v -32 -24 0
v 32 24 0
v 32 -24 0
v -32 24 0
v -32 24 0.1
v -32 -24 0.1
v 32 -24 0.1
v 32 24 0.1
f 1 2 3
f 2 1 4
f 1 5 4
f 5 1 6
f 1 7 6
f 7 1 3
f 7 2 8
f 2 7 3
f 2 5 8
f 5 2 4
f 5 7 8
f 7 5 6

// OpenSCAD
// file: ../p/4-4edge.scad
use <../lib.scad>
$fa=1; $fs=0.2;
function ldraw_lib__4_4edge(realsolid=false) = [
// 0 Circle 1.0
// 0 Name: 4-4edge.dat
// 0 Author: James Jessiman
// 0 !LDRAW_ORG Primitive UPDATE 2017-01
// 0 !LICENSE Licensed under CC BY 2.0 and CC BY 4.0 : see CAreadme.txt
// 
// 0 BFC CERTIFY CCW
  [0,"BFC","CERTIFY"],
  [0,"BFC","CCW"],
// 
// 0 !HISTORY 1998-12-15 [PTadmin] Official Update 1998-10
// 0 !HISTORY 2005-12-28 [PTadmin] Official Update 2005-01
// 0 !HISTORY 2007-06-24 [PTadmin] Header formatted for Contributor Agreement
// 0 !HISTORY 2008-07-01 [PTadmin] Official Update 2008-01
// 0 !HISTORY 2017-01-15 [Steffen] BFCed
// 0 !HISTORY 2017-12-30 [PTadmin] Official Update 2017-01
// 
// 
// 2 24 1 0 0 0.9239 0 0.3827
  [2,24,1,0,0,0.9239,0,0.3827],
// 2 24 0.9239 0 0.3827 0.7071 0 0.7071
  [2,24,0.9239,0,0.3827,0.7071,0,0.7071],
// 2 24 0.7071 0 0.7071 0.3827 0 0.9239
  [2,24,0.7071,0,0.7071,0.3827,0,0.9239],
// 2 24 0.3827 0 0.9239 0 0 1
  [2,24,0.3827,0,0.9239,0,0,1],
// 2 24 0 0 1 -0.3827 0 0.9239
  [2,24,0,0,1,-0.3827,0,0.9239],
// 2 24 -0.3827 0 0.9239 -0.7071 0 0.7071
  [2,24,-0.3827,0,0.9239,-0.7071,0,0.7071],
// 2 24 -0.7071 0 0.7071 -0.9239 0 0.3827
  [2,24,-0.7071,0,0.7071,-0.9239,0,0.3827],
// 2 24 -0.9239 0 0.3827 -1 0 -0
  [2,24,-0.9239,0,0.3827,-1,0,-0],
// 2 24 -1 0 -0 -0.9239 0 -0.3827
  [2,24,-1,0,-0,-0.9239,0,-0.3827],
// 2 24 -0.9239 0 -0.3827 -0.7071 0 -0.7071
  [2,24,-0.9239,0,-0.3827,-0.7071,0,-0.7071],
// 2 24 -0.7071 0 -0.7071 -0.3827 0 -0.9239
  [2,24,-0.7071,0,-0.7071,-0.3827,0,-0.9239],
// 2 24 -0.3827 0 -0.9239 0 0 -1
  [2,24,-0.3827,0,-0.9239,0,0,-1],
// 2 24 0 0 -1 0.3827 0 -0.9239
  [2,24,0,0,-1,0.3827,0,-0.9239],
// 2 24 0.3827 0 -0.9239 0.7071 0 -0.7071
  [2,24,0.3827,0,-0.9239,0.7071,0,-0.7071],
// 2 24 0.7071 0 -0.7071 0.9239 0 -0.3827
  [2,24,0.7071,0,-0.7071,0.9239,0,-0.3827],
// 2 24 0.9239 0 -0.3827 1 0 0
  [2,24,0.9239,0,-0.3827,1,0,0],
];
module ldraw_lib__4_4edge(step=0, col=false, unit=2/5, alt=false, line=0.2, solid=!$preview)
    makepoly(ldraw_lib__4_4edge(solid), step=step, col=col, unit=unit, alt=alt, line=line, solid=solid);
ldraw_lib__4_4edge(line=0.2);
// file: ../p/4-4disc.scad
use <../lib.scad>
$fa=1; $fs=0.2;
function ldraw_lib__4_4disc(realsolid=false) = [
// 0 Disc 1.0
// 0 Name: 4-4disc.dat
// 0 Author: James Jessiman
// 0 !LDRAW_ORG Primitive UPDATE 2002-02
// 0 !LICENSE Licensed under CC BY 2.0 and CC BY 4.0 : see CAreadme.txt
// 
// 0 BFC CERTIFY CCW
  [0,"BFC","CERTIFY"],
  [0,"BFC","CCW"],
// 
// 0 !HISTORY 1998-12-15 [PTadmin] Official Update 1998-10
// 0 !HISTORY 2002-03-23 [sbliss] Added BFC statement
// 0 !HISTORY 2002-04-25 [PTadmin] Official Update 2002-02
// 0 !HISTORY 2007-06-24 [PTadmin] Header formatted for Contributor Agreement
// 0 !HISTORY 2008-07-01 [PTadmin] Official Update 2008-01
// 
// 
// 3 16 0 0 0 1 0 0 0.9239 0 0.3827
  [3,16,0,0,0,1,0,0,0.9239,0,0.3827],
// 3 16 0 0 0 0.9239 0 0.3827 0.7071 0 0.7071
  [3,16,0,0,0,0.9239,0,0.3827,0.7071,0,0.7071],
// 3 16 0 0 0 0.7071 0 0.7071 0.3827 0 0.9239
  [3,16,0,0,0,0.7071,0,0.7071,0.3827,0,0.9239],
// 3 16 0 0 0 0.3827 0 0.9239 0 0 1
  [3,16,0,0,0,0.3827,0,0.9239,0,0,1],
// 3 16 0 0 0 0 0 1 -0.3827 0 0.9239
  [3,16,0,0,0,0,0,1,-0.3827,0,0.9239],
// 3 16 0 0 0 -0.3827 0 0.9239 -0.7071 0 0.7071
  [3,16,0,0,0,-0.3827,0,0.9239,-0.7071,0,0.7071],
// 3 16 0 0 0 -0.7071 0 0.7071 -0.9239 0 0.3827
  [3,16,0,0,0,-0.7071,0,0.7071,-0.9239,0,0.3827],
// 3 16 0 0 0 -0.9239 0 0.3827 -1 0 -0
  [3,16,0,0,0,-0.9239,0,0.3827,-1,0,-0],
// 3 16 0 0 0 -1 0 -0 -0.9239 0 -0.3827
  [3,16,0,0,0,-1,0,-0,-0.9239,0,-0.3827],
// 3 16 0 0 0 -0.9239 0 -0.3827 -0.7071 0 -0.7071
  [3,16,0,0,0,-0.9239,0,-0.3827,-0.7071,0,-0.7071],
// 3 16 0 0 0 -0.7071 0 -0.7071 -0.3827 0 -0.9239
  [3,16,0,0,0,-0.7071,0,-0.7071,-0.3827,0,-0.9239],
// 3 16 0 0 0 -0.3827 0 -0.9239 0 0 -1
  [3,16,0,0,0,-0.3827,0,-0.9239,0,0,-1],
// 3 16 0 0 0 0 0 -1 0.3827 0 -0.9239
  [3,16,0,0,0,0,0,-1,0.3827,0,-0.9239],
// 3 16 0 0 0 0.3827 0 -0.9239 0.7071 0 -0.7071
  [3,16,0,0,0,0.3827,0,-0.9239,0.7071,0,-0.7071],
// 3 16 0 0 0 0.7071 0 -0.7071 0.9239 0 -0.3827
  [3,16,0,0,0,0.7071,0,-0.7071,0.9239,0,-0.3827],
// 3 16 0 0 0 0.9239 0 -0.3827 1 0 0
  [3,16,0,0,0,0.9239,0,-0.3827,1,0,0],
// 0
];
module ldraw_lib__4_4disc(step=0, col=false, unit=2/5, alt=false, line=0.2, solid=!$preview)
    makepoly(ldraw_lib__4_4disc(solid), step=step, col=col, unit=unit, alt=alt, line=line, solid=solid);
ldraw_lib__4_4disc(line=0.2);
// file: ../p/4-4cyli.scad
use <../lib.scad>
$fa=1; $fs=0.2;
function ldraw_lib__4_4cyli(realsolid=false) = [
// 0 Cylinder 1.0
// 0 Name: 4-4cyli.dat
// 0 Author: James Jessiman
// 0 !LDRAW_ORG Primitive UPDATE 2005-01
// 0 !LICENSE Licensed under CC BY 2.0 and CC BY 4.0 : see CAreadme.txt
// 
// 0 BFC CERTIFY CCW
  [0,"BFC","CERTIFY"],
  [0,"BFC","CCW"],
// 
// 0 !HISTORY 1998-12-15 [PTadmin] Official Update 1998-10
// 0 !HISTORY 2002-03-23 [sbliss] Added BFC statement; merged headers from files in distributions LDraw 0.27 and Complete.
// 0 !HISTORY 2002-04-25 [PTadmin] Official Update 2002-02
// 0 !HISTORY 2004-12-14 [guyvivan] BFC CCW
// 0 !HISTORY 2005-12-28 [PTadmin] Official Update 2005-01
// 0 !HISTORY 2007-06-24 [PTadmin] Header formatted for Contributor Agreement
// 0 !HISTORY 2008-07-01 [PTadmin] Official Update 2008-01
// 
// 
// 4 16 1 1 0 0.9239 1 0.3827 0.9239 0 0.3827 1 0 0
  [4,16,1,1,0,0.9239,1,0.3827,0.9239,0,0.3827,1,0,0],
// 5 24 1 0 0 1 1 0 0.9239 0 0.3827 0.9239 0 -0.3827
  [5,24,1,0,0,1,1,0,0.9239,0,0.3827,0.9239,0,-0.3827],
// 4 16 0.9239 1 0.3827 0.7071 1 0.7071 0.7071 0 0.7071 0.9239 0 0.3827
  [4,16,0.9239,1,0.3827,0.7071,1,0.7071,0.7071,0,0.7071,0.9239,0,0.3827],
// 5 24 0.9239 0 0.3827 0.9239 1 0.3827 0.7071 0 0.7071 1 0 0
  [5,24,0.9239,0,0.3827,0.9239,1,0.3827,0.7071,0,0.7071,1,0,0],
// 4 16 0.7071 1 0.7071 0.3827 1 0.9239 0.3827 0 0.9239 0.7071 0 0.7071
  [4,16,0.7071,1,0.7071,0.3827,1,0.9239,0.3827,0,0.9239,0.7071,0,0.7071],
// 5 24 0.7071 0 0.7071 0.7071 1 0.7071 0.3827 0 0.9239 0.9239 0 0.3827
  [5,24,0.7071,0,0.7071,0.7071,1,0.7071,0.3827,0,0.9239,0.9239,0,0.3827],
// 4 16 0.3827 1 0.9239 0 1 1 0 0 1 0.3827 0 0.9239
  [4,16,0.3827,1,0.9239,0,1,1,0,0,1,0.3827,0,0.9239],
// 5 24 0.3827 0 0.9239 0.3827 1 0.9239 0 0 1 0.7071 0 0.7071
  [5,24,0.3827,0,0.9239,0.3827,1,0.9239,0,0,1,0.7071,0,0.7071],
// 4 16 0 1 1 -0.3827 1 0.9239 -0.3827 0 0.9239 0 0 1
  [4,16,0,1,1,-0.3827,1,0.9239,-0.3827,0,0.9239,0,0,1],
// 5 24 0 0 1 0 1 1 -0.3827 0 0.9239 0.3827 0 0.9239
  [5,24,0,0,1,0,1,1,-0.3827,0,0.9239,0.3827,0,0.9239],
// 4 16 -0.3827 1 0.9239 -0.7071 1 0.7071 -0.7071 0 0.7071 -0.3827 0 0.9239
  [4,16,-0.3827,1,0.9239,-0.7071,1,0.7071,-0.7071,0,0.7071,-0.3827,0,0.9239],
// 5 24 -0.3827 0 0.9239 -0.3827 1 0.9239 -0.7071 0 0.7071 0 0 1
  [5,24,-0.3827,0,0.9239,-0.3827,1,0.9239,-0.7071,0,0.7071,0,0,1],
// 4 16 -0.7071 1 0.7071 -0.9239 1 0.3827 -0.9239 0 0.3827 -0.7071 0 0.7071
  [4,16,-0.7071,1,0.7071,-0.9239,1,0.3827,-0.9239,0,0.3827,-0.7071,0,0.7071],
// 5 24 -0.7071 0 0.7071 -0.7071 1 0.7071 -0.9239 0 0.3827 -0.3827 0 0.9239
  [5,24,-0.7071,0,0.7071,-0.7071,1,0.7071,-0.9239,0,0.3827,-0.3827,0,0.9239],
// 4 16 -0.9239 1 0.3827 -1 1 0 -1 0 0 -0.9239 0 0.3827
  [4,16,-0.9239,1,0.3827,-1,1,0,-1,0,0,-0.9239,0,0.3827],
// 5 24 -0.9239 0 0.3827 -0.9239 1 0.3827 -1 0 0 -0.7071 0 0.7071
  [5,24,-0.9239,0,0.3827,-0.9239,1,0.3827,-1,0,0,-0.7071,0,0.7071],
// 4 16 -1 1 0 -0.9239 1 -0.3827 -0.9239 0 -0.3827 -1 0 0
  [4,16,-1,1,0,-0.9239,1,-0.3827,-0.9239,0,-0.3827,-1,0,0],
// 5 24 -1 0 0 -1 1 0 -0.9239 0 -0.3827 -0.9239 0 0.3827
  [5,24,-1,0,0,-1,1,0,-0.9239,0,-0.3827,-0.9239,0,0.3827],
// 4 16 -0.9239 1 -0.3827 -0.7071 1 -0.7071 -0.7071 0 -0.7071 -0.9239 0 -0.3827
  [4,16,-0.9239,1,-0.3827,-0.7071,1,-0.7071,-0.7071,0,-0.7071,-0.9239,0,-0.3827],
// 5 24 -0.9239 0 -0.3827 -0.9239 1 -0.3827 -0.7071 0 -0.7071 -1 0 0
  [5,24,-0.9239,0,-0.3827,-0.9239,1,-0.3827,-0.7071,0,-0.7071,-1,0,0],
// 4 16 -0.7071 1 -0.7071 -0.3827 1 -0.9239 -0.3827 0 -0.9239 -0.7071 0 -0.7071
  [4,16,-0.7071,1,-0.7071,-0.3827,1,-0.9239,-0.3827,0,-0.9239,-0.7071,0,-0.7071],
// 5 24 -0.7071 0 -0.7071 -0.7071 1 -0.7071 -0.3827 0 -0.9239 -0.9239 0 -0.3827
  [5,24,-0.7071,0,-0.7071,-0.7071,1,-0.7071,-0.3827,0,-0.9239,-0.9239,0,-0.3827],
// 4 16 -0.3827 1 -0.9239 0 1 -1 0 0 -1 -0.3827 0 -0.9239
  [4,16,-0.3827,1,-0.9239,0,1,-1,0,0,-1,-0.3827,0,-0.9239],
// 5 24 -0.3827 0 -0.9239 -0.3827 1 -0.9239 0 0 -1 -0.7071 0 -0.7071
  [5,24,-0.3827,0,-0.9239,-0.3827,1,-0.9239,0,0,-1,-0.7071,0,-0.7071],
// 4 16 0 1 -1 0.3827 1 -0.9239 0.3827 0 -0.9239 0 0 -1
  [4,16,0,1,-1,0.3827,1,-0.9239,0.3827,0,-0.9239,0,0,-1],
// 5 24 0 0 -1 0 1 -1 0.3827 0 -0.9239 -0.3827 0 -0.9239
  [5,24,0,0,-1,0,1,-1,0.3827,0,-0.9239,-0.3827,0,-0.9239],
// 4 16 0.3827 1 -0.9239 0.7071 1 -0.7071 0.7071 0 -0.7071 0.3827 0 -0.9239
  [4,16,0.3827,1,-0.9239,0.7071,1,-0.7071,0.7071,0,-0.7071,0.3827,0,-0.9239],
// 5 24 0.3827 0 -0.9239 0.3827 1 -0.9239 0.7071 0 -0.7071 0 0 -1
  [5,24,0.3827,0,-0.9239,0.3827,1,-0.9239,0.7071,0,-0.7071,0,0,-1],
// 4 16 0.7071 1 -0.7071 0.9239 1 -0.3827 0.9239 0 -0.3827 0.7071 0 -0.7071
  [4,16,0.7071,1,-0.7071,0.9239,1,-0.3827,0.9239,0,-0.3827,0.7071,0,-0.7071],
// 5 24 0.7071 0 -0.7071 0.7071 1 -0.7071 0.9239 0 -0.3827 0.3827 0 -0.9239
  [5,24,0.7071,0,-0.7071,0.7071,1,-0.7071,0.9239,0,-0.3827,0.3827,0,-0.9239],
// 4 16 0.9239 1 -0.3827 1 1 0 1 0 0 0.9239 0 -0.3827
  [4,16,0.9239,1,-0.3827,1,1,0,1,0,0,0.9239,0,-0.3827],
// 5 24 0.9239 0 -0.3827 0.9239 1 -0.3827 1 0 0 0.7071 0 -0.7071
  [5,24,0.9239,0,-0.3827,0.9239,1,-0.3827,1,0,0,0.7071,0,-0.7071],
// 0
];
module ldraw_lib__4_4cyli(step=0, col=false, unit=2/5, alt=false, line=0.2, solid=!$preview)
    makepoly(ldraw_lib__4_4cyli(solid), step=step, col=col, unit=unit, alt=alt, line=line, solid=solid);
ldraw_lib__4_4cyli(line=0.2);
// file: ../p/stud3.scad
use <../lib.scad>
use <4-4cyli.scad>
use <4-4disc.scad>
use <4-4edge.scad>
$fa=1; $fs=0.2;
function ldraw_lib__stud3(realsolid=false) = realsolid ? 
    [openscad(translate([0,0,-eps()], o=cylinder(4+eps(), r=4)),2)] : [
// 0 Stud Tube Solid
// 0 Name: stud3.dat
// 0 Author: James Jessiman
// 0 !LDRAW_ORG Primitive UPDATE 2012-01
// 0 !LICENSE Licensed under CC BY 2.0 and CC BY 4.0 : see CAreadme.txt
// 
// 0 BFC CERTIFY CCW
  [0,"BFC","CERTIFY"],
  [0,"BFC","CCW"],
// 
// 0 !HISTORY 2002-04-04 [sbliss] Modified for BFC compliance
// 0 !HISTORY 2002-04-25 [PTadmin] Official Update 2002-02
// 0 !HISTORY 2007-06-24 [PTadmin] Header formatted for Contributor Agreement
// 0 !HISTORY 2008-07-01 [PTadmin] Official Update 2008-01
// 0 !HISTORY 2012-02-16 [Philo] Changed to CCW
// 0 !HISTORY 2012-03-30 [PTadmin] Official Update 2012-01
// 
// 
// 1 16 0 -4 0 4 0 0 0 1 0 0 0 4 4-4edge.dat
  [1,16,0,-4,0,4,0,0,0,1,0,0,0,4, ldraw_lib__4_4edge(realsolid)],
// 1 16 0 0 0 4 0 0 0 1 0 0 0 4 4-4edge.dat
  [1,16,0,0,0,4,0,0,0,1,0,0,0,4, ldraw_lib__4_4edge(realsolid)],
// 1 16 0 -4 0 4 0 0 0 1 0 0 0 4 4-4disc.dat
  [1,16,0,-4,0,4,0,0,0,1,0,0,0,4, ldraw_lib__4_4disc(realsolid)],
// 1 16 0 -4 0 4 0 0 0 4 0 0 0 4 4-4cyli.dat
  [1,16,0,-4,0,4,0,0,0,4,0,0,0,4, ldraw_lib__4_4cyli(realsolid)],
];
module ldraw_lib__stud3(step=0, col=false, unit=2/5, alt=false, line=0.2, solid=!$preview)
    makepoly(ldraw_lib__stud3(solid), step=step, col=col, unit=unit, alt=alt, line=line, solid=solid);
ldraw_lib__stud3(line=0.2);
// file: ../p/stud.scad
use <../lib.scad>
use <4-4cyli.scad>
use <4-4disc.scad>
use <4-4edge.scad>
$fa=1; $fs=0.2;
function ldraw_lib__stud(realsolid=false) = realsolid ? 
    [openscad(translate([0,0,-eps()], o=cylinder(4+eps(), r=6)),2)] : [
// 0 Stud
// 0 Name: stud.dat
// 0 Author: James Jessiman
// 0 !LDRAW_ORG Primitive UPDATE 2012-01
// 0 !LICENSE Licensed under CC BY 2.0 and CC BY 4.0 : see CAreadme.txt
// 
// 0 BFC CERTIFY CCW
  [0,"BFC","CERTIFY"],
  [0,"BFC","CCW"],
// 
// 0 !HISTORY 2002-04-04 [sbliss] Modified for BFC compliance
// 0 !HISTORY 2002-04-25 [PTadmin] Official Update 2002-02
// 0 !HISTORY 2007-06-24 [PTadmin] Header formatted for Contributor Agreement
// 0 !HISTORY 2008-07-01 [PTadmin] Official Update 2008-01
// 0 !HISTORY 2012-02-16 [Philo] Changed to CCW
// 0 !HISTORY 2012-03-30 [PTadmin] Official Update 2012-01
// 
// 
// 1 16 0 0 0 6 0 0 0 1 0 0 0 6 4-4edge.dat
  [1,16,0,0,0,6,0,0,0,1,0,0,0,6, ldraw_lib__4_4edge(realsolid)],
// 1 16 0 -4 0 6 0 0 0 1 0 0 0 6 4-4edge.dat
  [1,16,0,-4,0,6,0,0,0,1,0,0,0,6, ldraw_lib__4_4edge(realsolid)],
// 1 16 0 0 0 6 0 0 0 -4 0 0 0 6 4-4cyli.dat
  [1,16,0,0,0,6,0,0,0,-4,0,0,0,6, ldraw_lib__4_4cyli(realsolid)],
// 1 16 0 -4 0 6 0 0 0 1 0 0 0 6 4-4disc.dat
  [1,16,0,-4,0,6,0,0,0,1,0,0,0,6, ldraw_lib__4_4disc(realsolid)],
];
module ldraw_lib__stud(step=0, col=false, unit=2/5, alt=false, line=0.2, solid=!$preview)
    makepoly(ldraw_lib__stud(solid), step=step, col=col, unit=unit, alt=alt, line=line, solid=solid);
ldraw_lib__stud(line=0.2);
// file: ../p/box5.scad
use <../lib.scad>
$fa=1; $fs=0.2;
function ldraw_lib__box5(realsolid=false) = [
// 0 Box with 5 Faces and All Edges
// 0 Name: box5.dat
// 0 Author: James Jessiman
// 0 !LDRAW_ORG Primitive UPDATE 2012-01
// 0 !LICENSE Licensed under CC BY 2.0 and CC BY 4.0 : see CAreadme.txt
// 
// 0 BFC CERTIFY CCW
  [0,"BFC","CERTIFY"],
  [0,"BFC","CCW"],
// 
// 0 !HISTORY 2002-04-03 [sbliss] Modified for BFC compliance
// 0 !HISTORY 2002-04-25 [PTadmin] Official Update 2002-02
// 0 !HISTORY 2007-06-24 [PTadmin] Header formatted for Contributor Agreement
// 0 !HISTORY 2008-07-01 [PTadmin] Official Update 2008-01
// 0 !HISTORY 2012-02-16 [Philo] Changed to CCW
// 0 !HISTORY 2012-03-30 [PTadmin] Official Update 2012-01
// 
// 
// 2 24 1 1 1 -1 1 1
  [2,24,1,1,1,-1,1,1],
// 2 24 -1 1 1 -1 1 -1
  [2,24,-1,1,1,-1,1,-1],
// 2 24 -1 1 -1 1 1 -1
  [2,24,-1,1,-1,1,1,-1],
// 2 24 1 1 -1 1 1 1
  [2,24,1,1,-1,1,1,1],
// 2 24 1 0 1 -1 0 1
  [2,24,1,0,1,-1,0,1],
// 2 24 -1 0 1 -1 0 -1
  [2,24,-1,0,1,-1,0,-1],
// 2 24 -1 0 -1 1 0 -1
  [2,24,-1,0,-1,1,0,-1],
// 2 24 1 0 -1 1 0 1
  [2,24,1,0,-1,1,0,1],
// 2 24 1 0 1 1 1 1
  [2,24,1,0,1,1,1,1],
// 2 24 -1 0 1 -1 1 1
  [2,24,-1,0,1,-1,1,1],
// 2 24 1 0 -1 1 1 -1
  [2,24,1,0,-1,1,1,-1],
// 2 24 -1 0 -1 -1 1 -1
  [2,24,-1,0,-1,-1,1,-1],
// 4 16 -1 1 1 1 1 1 1 1 -1 -1 1 -1
  [4,16,-1,1,1,1,1,1,1,1,-1,-1,1,-1],
// 4 16 -1 1 1 -1 0 1 1 0 1 1 1 1
  [4,16,-1,1,1,-1,0,1,1,0,1,1,1,1],
// 4 16 -1 1 -1 -1 0 -1 -1 0 1 -1 1 1
  [4,16,-1,1,-1,-1,0,-1,-1,0,1,-1,1,1],
// 4 16 1 1 -1 1 0 -1 -1 0 -1 -1 1 -1
  [4,16,1,1,-1,1,0,-1,-1,0,-1,-1,1,-1],
// 4 16 1 1 1 1 0 1 1 0 -1 1 1 -1
  [4,16,1,1,1,1,0,1,1,0,-1,1,1,-1],
];
module ldraw_lib__box5(step=0, col=false, unit=2/5, alt=false, line=0.2, solid=!$preview)
    makepoly(ldraw_lib__box5(solid), step=step, col=col, unit=unit, alt=alt, line=line, solid=solid);
ldraw_lib__box5(line=0.2);
// file: ../p/box4t.scad
use <../lib.scad>
$fa=1; $fs=0.2;
function ldraw_lib__box4t(realsolid=false) = [
// 0 Box with 4 Adjacent Faces and All Edges
// 0 Name: box4t.dat
// 0 Author: Tore Eriksson [Tore_Eriksson]
// 0 !LDRAW_ORG Primitive UPDATE 2003-02
// 0 !LICENSE Licensed under CC BY 2.0 and CC BY 4.0 : see CAreadme.txt
// 
// 0 BFC CERTIFY CCW
  [0,"BFC","CERTIFY"],
  [0,"BFC","CCW"],
// 
// 0 !HISTORY 1997-09-29 [PTadmin] Official Update 1997-15
// 0 !HISTORY 2002-08-31 [izanette] Modified with WINDZ for BFC compliance
// 0 !HISTORY 2003-08-01 [PTadmin] Official Update 2003-02
// 0 !HISTORY 2007-06-24 [PTadmin] Header formatted for Contributor Agreement
// 0 !HISTORY 2008-07-01 [PTadmin] Official Update 2008-01
// 
// 
// 2 24 1 1 1 -1 1 1
  [2,24,1,1,1,-1,1,1],
// 2 24 -1 1 1 -1 1 -1
  [2,24,-1,1,1,-1,1,-1],
// 2 24 -1 1 -1 1 1 -1
  [2,24,-1,1,-1,1,1,-1],
// 2 24 1 1 -1 1 1 1
  [2,24,1,1,-1,1,1,1],
// 2 24 1 0 1 -1 0 1
  [2,24,1,0,1,-1,0,1],
// 2 24 -1 0 1 -1 0 -1
  [2,24,-1,0,1,-1,0,-1],
// 2 24 -1 0 -1 1 0 -1
  [2,24,-1,0,-1,1,0,-1],
// 2 24 1 0 -1 1 0 1
  [2,24,1,0,-1,1,0,1],
// 2 24 1 0 1 1 1 1
  [2,24,1,0,1,1,1,1],
// 2 24 -1 0 1 -1 1 1
  [2,24,-1,0,1,-1,1,1],
// 2 24 1 0 -1 1 1 -1
  [2,24,1,0,-1,1,1,-1],
// 2 24 -1 0 -1 -1 1 -1
  [2,24,-1,0,-1,-1,1,-1],
// 4 16 1 1 1 1 1 -1 -1 1 -1 -1 1 1
  [4,16,1,1,1,1,1,-1,-1,1,-1,-1,1,1],
// 4 16 1 1 1 -1 1 1 -1 0 1 1 0 1
  [4,16,1,1,1,-1,1,1,-1,0,1,1,0,1],
// 4 16 -1 1 1 -1 1 -1 -1 0 -1 -1 0 1
  [4,16,-1,1,1,-1,1,-1,-1,0,-1,-1,0,1],
// 0 4 16 -1 1 -1 -1 0 -1 1 0 -1 1 1 -1
// 4 16 1 1 -1 1 1 1 1 0 1 1 0 -1
  [4,16,1,1,-1,1,1,1,1,0,1,1,0,-1],
// 0
];
module ldraw_lib__box4t(step=0, col=false, unit=2/5, alt=false, line=0.2, solid=!$preview)
    makepoly(ldraw_lib__box4t(solid), step=step, col=col, unit=unit, alt=alt, line=line, solid=solid);
ldraw_lib__box4t(line=0.2);
// file: s/3004s01.scad
use <../../lib.scad>
use <../../p/box4t.scad>
use <../../p/box5.scad>
use <../../p/stud.scad>
use <../../p/stud3.scad>
$fa=1; $fs=0.2;
function ldraw_lib__s__3004s01(realsolid=false) = [
// 0 ~Brick  1 x  2 without Front Face
// 0 Name: s\3004s01.dat
// 0 Author: James Jessiman
// 0 !LDRAW_ORG Subpart UPDATE 2003-03
// 0 !LICENSE Licensed under CC BY 2.0 and CC BY 4.0 : see CAreadme.txt
// 
// 0 BFC CERTIFY CCW
  [0,"BFC","CERTIFY"],
  [0,"BFC","CCW"],
// 
// 0 !HISTORY 2003-09-07 [jriley] Subfiling, BFC
// 0 !HISTORY 2003-12-19 [PTadmin] Official Update 2003-03
// 0 !HISTORY 2007-08-29 [PTadmin] Header formatted for Contributor Agreement
// 0 !HISTORY 2008-07-01 [PTadmin] Official Update 2008-01
// 
// 
// 1 16 0 4 0 1 0 0 0 -5 0 0 0 1 stud3.dat
  [1,16,0,4,0,1,0,0,0,-5,0,0,0,1, ldraw_lib__stud3(realsolid)],
// 0 BFC INVERTNEXT
  [0,"BFC","INVERTNEXT"],
// 1 16 0 24 0 16 0 0 0 -20 0 0 0 6 box5.dat
  [1,16,0,24,0,16,0,0,0,-20,0,0,0,6, ldraw_lib__box5(realsolid)],
// 4 16 20 24 10 16 24 6 -16 24 6 -20 24 10
  [4,16,20,24,10,16,24,6,-16,24,6,-20,24,10],
// 4 16 -20 24 10 -16 24 6 -16 24 -6 -20 24 -10
  [4,16,-20,24,10,-16,24,6,-16,24,-6,-20,24,-10],
// 4 16 -20 24 -10 -16 24 -6 16 24 -6 20 24 -10
  [4,16,-20,24,-10,-16,24,-6,16,24,-6,20,24,-10],
// 4 16 20 24 -10 16 24 -6 16 24 6 20 24 10
  [4,16,20,24,-10,16,24,-6,16,24,6,20,24,10],
// 1 16 0 24 0 20 0 0 0 -24 0 0 0 10 box4t.dat
  [1,16,0,24,0,20,0,0,0,-24,0,0,0,10, ldraw_lib__box4t(realsolid)],
// 1 16 10 0 0 1 0 0 0 1 0 0 0 1 stud.dat
  [1,16,10,0,0,1,0,0,0,1,0,0,0,1, ldraw_lib__stud(realsolid)],
// 1 16 -10 0 0 1 0 0 0 1 0 0 0 1 stud.dat
  [1,16,-10,0,0,1,0,0,0,1,0,0,0,1, ldraw_lib__stud(realsolid)],
// 0
];
module ldraw_lib__s__3004s01(step=0, col=false, unit=2/5, alt=false, line=0.2, solid=!$preview)
    makepoly(ldraw_lib__s__3004s01(solid), step=step, col=col, unit=unit, alt=alt, line=line, solid=solid);
ldraw_lib__s__3004s01(line=0.2);
// file: 3004.scad
use <../lib.scad>
use <s/3004s01.scad>
$fa=1; $fs=0.2;
function ldraw_lib__3004(realsolid=false) = [
// 0 Brick  1 x  2
// 0 Name: 3004.dat
// 0 Author: James Jessiman
// 0 !LDRAW_ORG Part UPDATE 2022-05
// 0 !LICENSE Licensed under CC BY 2.0 and CC BY 4.0 : see CAreadme.txt
// 
// 0 BFC CERTIFY CCW
  [0,"BFC","CERTIFY"],
  [0,"BFC","CCW"],
// 
// 0 !HISTORY 2001-10-26 [PTadmin] Official Update 2001-01
// 0 !HISTORY 2002-05-07 {unknown} BFC Certification
// 0 !HISTORY 2002-06-11 [PTadmin] Official Update 2002-03
// 0 !HISTORY 2007-05-07 [PTadmin] Header formatted for Contributor Agreement
// 0 !HISTORY 2008-07-01 [PTadmin] Official Update 2008-01
// 0 !HISTORY 2022-08-04 [MagFors] Using subfile
// 0 !HISTORY 2022-09-15 [PTadmin] Official Update 2022-05
// 
// 
// 1 16 0 0 0 1 0 0 0 1 0 0 0 1 s\3004s01.dat
  [1,16,0,0,0,1,0,0,0,1,0,0,0,1, ldraw_lib__s__3004s01(realsolid)],
// 4 16 -20 24 -10 20 24 -10 20 0 -10 -20 0 -10
  [4,16,-20,24,-10,20,24,-10,20,0,-10,-20,0,-10],
];
module ldraw_lib__3004(step=0, col=false, unit=2/5, alt=false, line=0.2, solid=!$preview)
    makepoly(ldraw_lib__3004(solid), step=step, col=col, unit=unit, alt=alt, line=line, solid=solid);
ldraw_lib__3004(line=0.2);
// file: ../p/box5-12.scad
use <../lib.scad>
$fa=1; $fs=0.2;
function ldraw_lib__box5_12(realsolid=false) = [
// 0 Box with 5 Faces without Any Edges
// 0 Name: box5-12.dat
// 0 Author: Chris Dee [cwdee]
// 0 !LDRAW_ORG Primitive UPDATE 2009-02
// 0 !LICENSE Licensed under CC BY 2.0 and CC BY 4.0 : see CAreadme.txt
// 
// 0 BFC CERTIFY CCW
  [0,"BFC","CERTIFY"],
  [0,"BFC","CCW"],
// 
// 0 !HISTORY 2009-09-03 [PTadmin] Official Update 2009-02
// 
// 
// 4 16 1 1 1 1 1 -1 -1 1 -1 -1 1 1
  [4,16,1,1,1,1,1,-1,-1,1,-1,-1,1,1],
// 4 16 -1 0 1 1 0 1 1 1 1 -1 1 1
  [4,16,-1,0,1,1,0,1,1,1,1,-1,1,1],
// 4 16 -1 0 -1 -1 0 1 -1 1 1 -1 1 -1
  [4,16,-1,0,-1,-1,0,1,-1,1,1,-1,1,-1],
// 4 16 1 0 -1 -1 0 -1 -1 1 -1 1 1 -1
  [4,16,1,0,-1,-1,0,-1,-1,1,-1,1,1,-1],
// 4 16 1 0 1 1 0 -1 1 1 -1 1 1 1
  [4,16,1,0,1,1,0,-1,1,1,-1,1,1,1],
// 0
];
module ldraw_lib__box5_12(step=0, col=false, unit=2/5, alt=false, line=0.2, solid=!$preview)
    makepoly(ldraw_lib__box5_12(solid), step=step, col=col, unit=unit, alt=alt, line=line, solid=solid);
ldraw_lib__box5_12(line=0.2);
// main file
use <../lib.scad>
use <../p/box5-12.scad>
$fa=1; $fs=0.2;
function ldraw_lib__6313371a(realsolid=false) = [
// 0 Sticker  6 x 8 with Crocodile Locomotive
// 0 Name: 6313371a.dat
// 0 Author: Ulrich Röder [UR]
// 0 !LDRAW_ORG Part UPDATE 2022-02
// 0 !LICENSE Licensed under CC BY 2.0 and CC BY 4.0 : see CAreadme.txt
// 
// 0 BFC CERTIFY CCW
  [0,"BFC","CERTIFY"],
  [0,"BFC","CCW"],
// 
// 0 !KEYWORDS Set 10277
// 
// 0 !HISTORY 2022-03-06 [PTadmin] Official Update 2022-02
// 
// 
// 1 16 0 -0.25 0 0 0 -80 0 0.25 0 60 0 0 box5-12.dat
  [1,16,0,-0.25,0,0,0,-80,0,0.25,0,60,0,0, ldraw_lib__box5_12(realsolid)],
// 0 !TEXMAP START PLANAR -80 -0.25 60 80 -0.25 60 -80 -0.25 -60 6313371a.png
// 0 !: 4 0 -80 -0.25 60 -80 -0.25 -60 80 -0.25 -60 80 -0.25 60
// 0 !TEXMAP FALLBACK
// 0 // Needs Work: fallback pattern
// 4 0 -80 -0.25 60 -80 -0.25 -60 80 -0.25 -60 80 -0.25 60
  [4,0,-80,-0.25,60,-80,-0.25,-60,80,-0.25,-60,80,-0.25,60],
// 0 !TEXMAP END
];
module ldraw_lib__6313371a(step=0, col=false, unit=2/5, alt=false, line=0.2, solid=!$preview)
    makepoly(ldraw_lib__6313371a(solid), step=step, col=col, unit=unit, alt=alt, line=line, solid=solid);
ldraw_lib__6313371a(line=0.2);
